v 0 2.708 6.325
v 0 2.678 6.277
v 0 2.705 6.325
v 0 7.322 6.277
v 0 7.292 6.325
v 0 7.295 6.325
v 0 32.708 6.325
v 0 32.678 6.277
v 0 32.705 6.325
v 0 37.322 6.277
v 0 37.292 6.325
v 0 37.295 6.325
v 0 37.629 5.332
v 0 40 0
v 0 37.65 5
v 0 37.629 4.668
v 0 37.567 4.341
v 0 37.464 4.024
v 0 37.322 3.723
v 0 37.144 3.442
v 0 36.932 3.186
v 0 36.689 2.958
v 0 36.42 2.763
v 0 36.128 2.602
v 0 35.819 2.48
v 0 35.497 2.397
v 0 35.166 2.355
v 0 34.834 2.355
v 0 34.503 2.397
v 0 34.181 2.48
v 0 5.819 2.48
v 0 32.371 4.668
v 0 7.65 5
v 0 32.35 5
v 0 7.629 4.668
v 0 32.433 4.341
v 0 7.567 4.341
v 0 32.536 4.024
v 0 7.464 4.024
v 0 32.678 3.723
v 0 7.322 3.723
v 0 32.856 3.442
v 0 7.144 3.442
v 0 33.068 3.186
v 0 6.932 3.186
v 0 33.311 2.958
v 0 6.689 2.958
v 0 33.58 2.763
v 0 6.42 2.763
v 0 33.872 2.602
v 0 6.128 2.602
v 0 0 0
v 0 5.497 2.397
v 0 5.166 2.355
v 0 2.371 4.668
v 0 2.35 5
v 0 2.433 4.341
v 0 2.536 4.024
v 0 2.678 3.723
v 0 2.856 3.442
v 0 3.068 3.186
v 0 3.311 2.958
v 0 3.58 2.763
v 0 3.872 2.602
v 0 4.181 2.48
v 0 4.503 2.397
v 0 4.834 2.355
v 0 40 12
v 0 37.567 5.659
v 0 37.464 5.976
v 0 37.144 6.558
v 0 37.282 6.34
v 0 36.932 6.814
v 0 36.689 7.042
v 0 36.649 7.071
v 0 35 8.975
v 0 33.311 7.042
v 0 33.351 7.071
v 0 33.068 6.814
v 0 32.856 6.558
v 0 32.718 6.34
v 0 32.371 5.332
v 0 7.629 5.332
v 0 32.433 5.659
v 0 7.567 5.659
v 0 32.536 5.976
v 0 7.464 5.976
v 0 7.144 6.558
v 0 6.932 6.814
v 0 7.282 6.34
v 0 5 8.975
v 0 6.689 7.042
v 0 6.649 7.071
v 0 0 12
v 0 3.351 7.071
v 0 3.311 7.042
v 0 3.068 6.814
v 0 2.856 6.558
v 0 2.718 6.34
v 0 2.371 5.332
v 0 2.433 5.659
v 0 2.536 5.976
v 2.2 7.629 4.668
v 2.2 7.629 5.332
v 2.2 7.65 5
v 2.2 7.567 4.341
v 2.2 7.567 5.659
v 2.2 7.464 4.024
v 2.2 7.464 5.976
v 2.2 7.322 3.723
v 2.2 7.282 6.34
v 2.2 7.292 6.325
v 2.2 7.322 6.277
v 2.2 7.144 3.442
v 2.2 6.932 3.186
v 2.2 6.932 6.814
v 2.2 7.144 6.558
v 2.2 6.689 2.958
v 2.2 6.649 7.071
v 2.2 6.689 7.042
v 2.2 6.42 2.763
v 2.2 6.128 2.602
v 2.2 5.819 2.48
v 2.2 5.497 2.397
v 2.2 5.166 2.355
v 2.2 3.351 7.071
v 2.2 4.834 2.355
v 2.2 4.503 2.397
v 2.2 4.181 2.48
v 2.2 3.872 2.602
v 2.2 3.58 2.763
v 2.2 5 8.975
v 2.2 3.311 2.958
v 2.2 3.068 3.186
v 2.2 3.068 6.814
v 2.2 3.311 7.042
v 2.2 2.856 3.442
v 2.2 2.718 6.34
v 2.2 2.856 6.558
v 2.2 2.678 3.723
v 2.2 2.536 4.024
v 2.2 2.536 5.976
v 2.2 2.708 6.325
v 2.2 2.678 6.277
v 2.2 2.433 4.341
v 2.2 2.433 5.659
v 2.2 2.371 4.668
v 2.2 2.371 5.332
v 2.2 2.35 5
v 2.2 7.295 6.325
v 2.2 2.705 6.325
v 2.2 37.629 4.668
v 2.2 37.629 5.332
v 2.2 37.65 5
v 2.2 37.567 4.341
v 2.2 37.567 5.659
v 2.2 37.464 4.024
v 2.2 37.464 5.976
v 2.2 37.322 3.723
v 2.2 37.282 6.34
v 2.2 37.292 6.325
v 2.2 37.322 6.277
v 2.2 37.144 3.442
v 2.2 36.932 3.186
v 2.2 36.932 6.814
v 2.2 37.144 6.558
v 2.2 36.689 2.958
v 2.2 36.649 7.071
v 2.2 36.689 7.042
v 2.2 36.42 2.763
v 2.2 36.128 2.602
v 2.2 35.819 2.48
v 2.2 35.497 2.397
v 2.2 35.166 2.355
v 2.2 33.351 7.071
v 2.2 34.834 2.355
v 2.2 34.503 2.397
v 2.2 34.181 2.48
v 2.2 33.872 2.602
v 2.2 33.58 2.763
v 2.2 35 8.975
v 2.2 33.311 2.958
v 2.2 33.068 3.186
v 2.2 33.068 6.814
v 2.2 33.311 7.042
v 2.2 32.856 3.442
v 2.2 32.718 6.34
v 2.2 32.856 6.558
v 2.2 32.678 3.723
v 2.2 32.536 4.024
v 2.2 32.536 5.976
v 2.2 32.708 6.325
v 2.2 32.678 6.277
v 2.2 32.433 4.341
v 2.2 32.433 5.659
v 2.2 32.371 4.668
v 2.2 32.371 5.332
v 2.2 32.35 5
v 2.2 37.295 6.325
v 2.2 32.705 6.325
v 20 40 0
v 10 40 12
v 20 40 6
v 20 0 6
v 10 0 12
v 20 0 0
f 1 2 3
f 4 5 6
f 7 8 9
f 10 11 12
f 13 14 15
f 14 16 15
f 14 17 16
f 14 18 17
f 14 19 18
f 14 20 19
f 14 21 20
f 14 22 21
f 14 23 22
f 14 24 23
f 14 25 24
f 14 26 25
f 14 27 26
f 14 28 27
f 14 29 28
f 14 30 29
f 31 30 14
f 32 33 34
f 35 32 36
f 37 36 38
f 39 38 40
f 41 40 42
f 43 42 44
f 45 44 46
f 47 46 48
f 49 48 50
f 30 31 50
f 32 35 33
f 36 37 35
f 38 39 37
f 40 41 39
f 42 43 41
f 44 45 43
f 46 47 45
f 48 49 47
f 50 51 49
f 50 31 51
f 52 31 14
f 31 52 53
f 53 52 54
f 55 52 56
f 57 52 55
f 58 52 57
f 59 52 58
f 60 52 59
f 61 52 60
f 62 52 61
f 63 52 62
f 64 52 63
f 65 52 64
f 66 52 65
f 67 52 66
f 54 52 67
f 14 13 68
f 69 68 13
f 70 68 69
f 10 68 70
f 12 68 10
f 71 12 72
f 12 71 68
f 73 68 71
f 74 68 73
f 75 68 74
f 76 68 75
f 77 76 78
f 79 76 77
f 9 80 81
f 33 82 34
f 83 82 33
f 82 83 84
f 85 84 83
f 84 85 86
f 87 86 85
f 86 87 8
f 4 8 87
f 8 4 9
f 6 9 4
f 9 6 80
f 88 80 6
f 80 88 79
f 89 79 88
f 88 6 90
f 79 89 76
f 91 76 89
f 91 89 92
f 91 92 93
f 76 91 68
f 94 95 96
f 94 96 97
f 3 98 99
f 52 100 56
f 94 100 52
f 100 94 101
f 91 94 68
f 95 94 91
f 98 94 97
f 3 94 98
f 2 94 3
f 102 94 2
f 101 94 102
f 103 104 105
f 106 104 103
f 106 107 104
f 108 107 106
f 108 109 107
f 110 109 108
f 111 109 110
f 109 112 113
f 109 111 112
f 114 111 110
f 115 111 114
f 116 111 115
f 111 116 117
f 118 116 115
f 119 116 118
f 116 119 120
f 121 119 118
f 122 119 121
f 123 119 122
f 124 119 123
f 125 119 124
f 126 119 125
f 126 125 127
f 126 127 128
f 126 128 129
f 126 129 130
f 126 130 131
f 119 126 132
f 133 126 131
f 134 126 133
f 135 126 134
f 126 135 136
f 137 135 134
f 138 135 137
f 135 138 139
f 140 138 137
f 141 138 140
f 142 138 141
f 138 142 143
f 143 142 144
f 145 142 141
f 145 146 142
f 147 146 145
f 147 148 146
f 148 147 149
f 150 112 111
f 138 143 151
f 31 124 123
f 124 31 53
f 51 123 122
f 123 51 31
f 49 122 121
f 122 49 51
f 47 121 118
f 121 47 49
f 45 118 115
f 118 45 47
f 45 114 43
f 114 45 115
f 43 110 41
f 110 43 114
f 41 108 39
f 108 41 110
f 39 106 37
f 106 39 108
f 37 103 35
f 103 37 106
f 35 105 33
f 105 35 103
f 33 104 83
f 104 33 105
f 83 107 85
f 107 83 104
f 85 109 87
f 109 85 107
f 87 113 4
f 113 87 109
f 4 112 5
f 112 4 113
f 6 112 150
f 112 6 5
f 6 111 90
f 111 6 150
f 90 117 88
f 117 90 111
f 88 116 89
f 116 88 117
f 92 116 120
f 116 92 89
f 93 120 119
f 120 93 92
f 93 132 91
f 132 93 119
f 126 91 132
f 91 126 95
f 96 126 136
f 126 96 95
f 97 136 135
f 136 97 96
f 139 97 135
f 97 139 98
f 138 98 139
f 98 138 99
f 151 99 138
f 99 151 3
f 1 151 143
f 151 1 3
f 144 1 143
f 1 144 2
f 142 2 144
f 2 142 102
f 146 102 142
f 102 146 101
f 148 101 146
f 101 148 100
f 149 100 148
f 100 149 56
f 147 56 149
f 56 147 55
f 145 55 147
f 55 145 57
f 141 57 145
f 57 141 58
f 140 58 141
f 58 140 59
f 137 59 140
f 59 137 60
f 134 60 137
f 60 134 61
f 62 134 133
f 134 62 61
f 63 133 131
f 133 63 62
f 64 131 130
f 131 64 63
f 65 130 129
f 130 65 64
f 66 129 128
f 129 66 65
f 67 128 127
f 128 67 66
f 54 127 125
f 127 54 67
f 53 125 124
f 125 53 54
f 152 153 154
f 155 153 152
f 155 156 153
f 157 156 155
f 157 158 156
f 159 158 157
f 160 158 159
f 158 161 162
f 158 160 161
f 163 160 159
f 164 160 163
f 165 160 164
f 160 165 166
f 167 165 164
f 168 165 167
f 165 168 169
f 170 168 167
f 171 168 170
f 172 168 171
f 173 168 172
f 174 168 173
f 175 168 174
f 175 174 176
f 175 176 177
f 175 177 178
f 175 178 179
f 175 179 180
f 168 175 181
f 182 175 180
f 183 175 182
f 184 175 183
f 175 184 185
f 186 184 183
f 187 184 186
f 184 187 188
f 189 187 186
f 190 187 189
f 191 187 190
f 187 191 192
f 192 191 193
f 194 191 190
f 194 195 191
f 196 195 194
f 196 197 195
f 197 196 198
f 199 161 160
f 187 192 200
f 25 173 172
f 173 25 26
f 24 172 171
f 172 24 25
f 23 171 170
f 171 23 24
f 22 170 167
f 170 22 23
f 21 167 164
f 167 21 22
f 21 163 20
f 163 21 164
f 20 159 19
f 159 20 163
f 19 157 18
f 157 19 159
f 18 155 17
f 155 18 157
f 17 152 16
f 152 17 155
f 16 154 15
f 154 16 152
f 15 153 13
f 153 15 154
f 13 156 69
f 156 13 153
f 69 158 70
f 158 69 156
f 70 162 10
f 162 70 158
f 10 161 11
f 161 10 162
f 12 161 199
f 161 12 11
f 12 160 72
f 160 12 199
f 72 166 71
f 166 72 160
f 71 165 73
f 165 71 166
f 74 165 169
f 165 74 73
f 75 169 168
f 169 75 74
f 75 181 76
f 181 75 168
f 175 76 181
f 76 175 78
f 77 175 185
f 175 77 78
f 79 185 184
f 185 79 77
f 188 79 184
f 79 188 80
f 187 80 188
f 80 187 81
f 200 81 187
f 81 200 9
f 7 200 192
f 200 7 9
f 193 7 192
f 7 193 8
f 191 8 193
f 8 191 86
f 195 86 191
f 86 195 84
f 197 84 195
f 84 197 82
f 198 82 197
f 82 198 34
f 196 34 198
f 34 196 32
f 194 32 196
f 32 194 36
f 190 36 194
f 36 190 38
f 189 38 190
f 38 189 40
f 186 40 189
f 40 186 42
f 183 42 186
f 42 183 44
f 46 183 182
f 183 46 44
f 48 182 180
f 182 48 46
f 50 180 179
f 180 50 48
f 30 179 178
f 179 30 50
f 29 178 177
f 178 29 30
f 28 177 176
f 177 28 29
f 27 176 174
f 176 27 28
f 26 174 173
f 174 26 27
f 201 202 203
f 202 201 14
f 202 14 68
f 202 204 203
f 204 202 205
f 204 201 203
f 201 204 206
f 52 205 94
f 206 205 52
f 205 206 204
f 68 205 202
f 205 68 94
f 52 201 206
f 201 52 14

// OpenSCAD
// file: shared_variables.scad
$fn = 50;

base_thickness = 10;
base_height = 40;
base_width = 200;

base_center = [
        base_width / 2,
        base_height / 2,
    ];

text_inset_y = 15;
text_inset_x = 20; // Only used for left justification
text_size = base_height - text_inset_y;

magnet_diameter = 5 + 0.3;
magnet_depth = 2 + 0.2;
magnet_inset = 5;

border_width = 1;
border_height = 2;
// file: ../utils/misc.scad
module rounded_rectangle(width, height, corner_radius, center = false) {

    x_offset = center ? -width/2 : 0;
    y_offset = center ? -height/2 : 0;

    corners_points = [
            [corner_radius, corner_radius],
            [width - corner_radius, corner_radius],
            [width - corner_radius, height - corner_radius],
            [corner_radius, height - corner_radius],
        ];

    hull() {
        for (p = corners_points) {
            translate([p.x + x_offset, p.y + y_offset, -1])
                circle(corner_radius);
        }
    }
}


module circle_segment(radius, cut_off_height) {
    intersection() {
        translate([0, -cut_off_height]) {
            circle(radius);
        }
        translate([-radius, 0]) {
            square([radius * 2, cut_off_height * 2]);
        }
    }
}

module tear_drop_circle(d) {
    r = d / 2;
    angle = 30;
    offset_y = r / 2;
    offset_x = cos(angle) * r;

    triangle_points = [
            [-offset_x, r / 2],
            [offset_x, r / 2],
            [0, 3 / 2 * r]
        ];

    polygon(triangle_points);
    circle(d = d);

}
// main file
use <../utils/misc.scad>
include <./shared_variables.scad>

frame_width = base_height / 2;
frame_thickness = base_thickness + border_height;

frame_section(num_units = 4);

module frame(num_units) {
    for (i = [0 : num_units - 1]) {
        offset_y = i * base_height;
        translate([0, offset_y]) {
            frame_section();
        }
    }
}

module frame_section() {
    difference() {
        frame_section_base();

        union() {
            magnet_cutouts();
            #frame_taper_cutout();
        }
    }
}

module frame_section_base() {
    color("white") {
        linear_extrude(frame_thickness) {
            square([frame_width, base_height]);
        }
    }
}

module frame_taper_cutout() {
    points = [
            [frame_width / 2, frame_thickness],
            [frame_width, frame_thickness],
            [frame_width, frame_thickness / 2]
        ];


    translate([0, base_height]) {
        rotate(90, [1, 0, 0]) {
            linear_extrude(base_height) {
                polygon(points);
            }
        }
    }
}

module magnet_cutouts() {
    far_offset_y = base_height - magnet_inset;

    translate([0, magnet_inset, magnet_inset])
        rotate(90, [0, 0, 1])
            rotate(90, [1, 0, 0])
                linear_extrude(magnet_depth) {
                    tear_drop_circle(d = magnet_diameter);
                }

    translate([0, far_offset_y, magnet_inset])
        rotate(90, [0, 0, 1])
            rotate(90, [1, 0, 0])
                linear_extrude(magnet_depth) {
                    tear_drop_circle(d = magnet_diameter);
                }
}
